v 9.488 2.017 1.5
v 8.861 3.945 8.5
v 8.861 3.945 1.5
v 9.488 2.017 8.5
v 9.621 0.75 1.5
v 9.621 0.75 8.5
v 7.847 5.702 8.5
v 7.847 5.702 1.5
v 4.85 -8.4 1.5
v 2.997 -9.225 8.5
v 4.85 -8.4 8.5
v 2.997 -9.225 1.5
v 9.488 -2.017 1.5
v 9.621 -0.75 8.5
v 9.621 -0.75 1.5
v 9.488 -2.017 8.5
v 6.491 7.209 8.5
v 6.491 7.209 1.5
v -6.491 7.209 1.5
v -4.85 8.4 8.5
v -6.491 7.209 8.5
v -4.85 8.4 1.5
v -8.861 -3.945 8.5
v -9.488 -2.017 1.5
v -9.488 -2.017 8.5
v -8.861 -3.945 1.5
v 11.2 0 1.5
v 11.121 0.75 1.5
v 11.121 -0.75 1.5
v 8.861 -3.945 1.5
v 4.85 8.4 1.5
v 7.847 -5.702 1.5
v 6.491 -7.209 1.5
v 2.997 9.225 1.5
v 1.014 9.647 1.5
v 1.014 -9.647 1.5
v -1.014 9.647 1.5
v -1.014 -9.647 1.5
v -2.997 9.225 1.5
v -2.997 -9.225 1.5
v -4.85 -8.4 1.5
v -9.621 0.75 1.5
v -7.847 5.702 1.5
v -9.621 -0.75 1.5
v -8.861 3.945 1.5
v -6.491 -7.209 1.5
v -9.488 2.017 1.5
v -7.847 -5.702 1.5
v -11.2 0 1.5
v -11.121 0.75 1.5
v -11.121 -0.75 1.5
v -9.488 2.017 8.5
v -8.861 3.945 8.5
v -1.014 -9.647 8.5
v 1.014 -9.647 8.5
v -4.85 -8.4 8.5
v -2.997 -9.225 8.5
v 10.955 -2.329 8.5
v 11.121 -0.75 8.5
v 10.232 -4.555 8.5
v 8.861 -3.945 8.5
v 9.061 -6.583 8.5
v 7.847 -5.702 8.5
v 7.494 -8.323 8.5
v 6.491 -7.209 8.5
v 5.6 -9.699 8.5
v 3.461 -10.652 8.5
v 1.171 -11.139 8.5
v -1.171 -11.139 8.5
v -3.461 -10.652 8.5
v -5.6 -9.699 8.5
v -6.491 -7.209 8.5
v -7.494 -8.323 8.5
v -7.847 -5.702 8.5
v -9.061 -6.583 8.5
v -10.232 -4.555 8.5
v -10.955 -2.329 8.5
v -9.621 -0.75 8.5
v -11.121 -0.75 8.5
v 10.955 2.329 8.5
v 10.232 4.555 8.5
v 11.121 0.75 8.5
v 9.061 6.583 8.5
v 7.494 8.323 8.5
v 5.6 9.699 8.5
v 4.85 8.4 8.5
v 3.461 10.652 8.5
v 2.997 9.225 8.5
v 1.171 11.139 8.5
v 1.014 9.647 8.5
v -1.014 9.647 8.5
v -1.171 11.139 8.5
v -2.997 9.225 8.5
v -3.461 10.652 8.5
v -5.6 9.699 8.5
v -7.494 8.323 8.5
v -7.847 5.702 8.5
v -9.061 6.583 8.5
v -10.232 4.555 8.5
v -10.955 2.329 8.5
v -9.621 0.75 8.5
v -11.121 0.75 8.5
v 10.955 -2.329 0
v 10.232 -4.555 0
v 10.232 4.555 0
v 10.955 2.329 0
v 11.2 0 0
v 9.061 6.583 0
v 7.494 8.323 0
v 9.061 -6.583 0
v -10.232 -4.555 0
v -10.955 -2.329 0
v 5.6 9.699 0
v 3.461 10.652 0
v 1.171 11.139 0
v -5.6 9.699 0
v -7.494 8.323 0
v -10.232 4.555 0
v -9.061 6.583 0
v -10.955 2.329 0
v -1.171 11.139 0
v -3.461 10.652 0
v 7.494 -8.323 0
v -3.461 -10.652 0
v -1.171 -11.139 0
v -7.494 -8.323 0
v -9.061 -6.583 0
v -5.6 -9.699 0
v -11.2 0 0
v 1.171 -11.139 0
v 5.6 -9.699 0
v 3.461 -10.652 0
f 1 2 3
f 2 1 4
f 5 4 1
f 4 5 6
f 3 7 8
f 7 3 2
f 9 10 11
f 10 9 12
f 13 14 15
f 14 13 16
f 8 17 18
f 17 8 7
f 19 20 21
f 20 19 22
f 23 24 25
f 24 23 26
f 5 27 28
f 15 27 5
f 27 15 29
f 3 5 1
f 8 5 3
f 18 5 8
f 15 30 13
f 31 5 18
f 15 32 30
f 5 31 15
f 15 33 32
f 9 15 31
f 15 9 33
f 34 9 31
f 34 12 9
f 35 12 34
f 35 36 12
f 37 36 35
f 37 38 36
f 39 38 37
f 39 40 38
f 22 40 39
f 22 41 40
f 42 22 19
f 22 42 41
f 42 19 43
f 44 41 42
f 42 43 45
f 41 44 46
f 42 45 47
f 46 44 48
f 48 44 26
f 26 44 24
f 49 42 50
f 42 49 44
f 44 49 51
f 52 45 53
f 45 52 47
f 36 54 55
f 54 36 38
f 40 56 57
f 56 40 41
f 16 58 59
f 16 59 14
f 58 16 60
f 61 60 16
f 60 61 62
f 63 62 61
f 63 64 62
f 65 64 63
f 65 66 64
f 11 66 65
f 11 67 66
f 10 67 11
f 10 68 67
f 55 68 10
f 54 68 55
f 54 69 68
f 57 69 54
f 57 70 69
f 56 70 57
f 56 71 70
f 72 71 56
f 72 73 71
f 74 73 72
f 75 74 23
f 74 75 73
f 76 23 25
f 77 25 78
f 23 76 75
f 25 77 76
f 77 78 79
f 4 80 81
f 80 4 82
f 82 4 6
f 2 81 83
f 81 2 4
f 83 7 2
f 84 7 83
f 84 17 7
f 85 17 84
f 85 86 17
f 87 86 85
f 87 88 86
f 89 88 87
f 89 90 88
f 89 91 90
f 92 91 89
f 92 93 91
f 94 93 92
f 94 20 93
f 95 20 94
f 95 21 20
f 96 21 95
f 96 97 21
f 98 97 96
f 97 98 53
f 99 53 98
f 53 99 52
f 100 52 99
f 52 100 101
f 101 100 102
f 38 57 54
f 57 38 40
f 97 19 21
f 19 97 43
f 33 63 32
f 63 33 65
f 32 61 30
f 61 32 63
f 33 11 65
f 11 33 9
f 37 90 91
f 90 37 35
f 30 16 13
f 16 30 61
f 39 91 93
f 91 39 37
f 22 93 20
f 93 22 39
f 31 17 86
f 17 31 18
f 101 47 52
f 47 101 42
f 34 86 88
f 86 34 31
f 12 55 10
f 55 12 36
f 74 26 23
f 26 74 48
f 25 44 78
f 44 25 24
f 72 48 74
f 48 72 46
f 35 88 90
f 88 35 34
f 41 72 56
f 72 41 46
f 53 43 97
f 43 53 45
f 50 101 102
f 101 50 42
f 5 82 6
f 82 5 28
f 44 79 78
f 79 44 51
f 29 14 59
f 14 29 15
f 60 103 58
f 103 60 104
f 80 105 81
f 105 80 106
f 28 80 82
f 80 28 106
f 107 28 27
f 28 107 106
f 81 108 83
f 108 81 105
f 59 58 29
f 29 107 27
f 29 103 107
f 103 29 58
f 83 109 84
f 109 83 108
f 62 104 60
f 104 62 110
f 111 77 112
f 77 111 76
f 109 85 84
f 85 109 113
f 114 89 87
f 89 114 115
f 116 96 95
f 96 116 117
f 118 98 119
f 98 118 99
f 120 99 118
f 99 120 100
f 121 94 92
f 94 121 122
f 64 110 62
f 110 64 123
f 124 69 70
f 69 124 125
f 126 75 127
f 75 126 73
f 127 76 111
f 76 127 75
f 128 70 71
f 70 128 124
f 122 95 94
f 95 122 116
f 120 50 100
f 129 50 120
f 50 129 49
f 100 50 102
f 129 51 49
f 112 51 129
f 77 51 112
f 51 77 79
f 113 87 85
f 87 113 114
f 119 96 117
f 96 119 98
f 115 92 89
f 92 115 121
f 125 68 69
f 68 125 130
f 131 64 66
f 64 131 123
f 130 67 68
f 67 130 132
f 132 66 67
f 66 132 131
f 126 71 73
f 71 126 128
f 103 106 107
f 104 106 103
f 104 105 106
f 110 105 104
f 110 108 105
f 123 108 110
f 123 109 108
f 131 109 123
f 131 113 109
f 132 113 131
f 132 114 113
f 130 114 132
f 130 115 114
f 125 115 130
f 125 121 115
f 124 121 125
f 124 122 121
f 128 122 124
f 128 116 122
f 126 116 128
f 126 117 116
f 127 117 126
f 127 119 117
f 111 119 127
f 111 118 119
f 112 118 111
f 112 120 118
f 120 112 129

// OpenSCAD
width = 19.4; //mm
height = 7; //mm
thickness = 1.5; //mm

difference() {
    cylinder(r = width / 2 + thickness, h = height + thickness);
    translate([0,0,thickness]) {
        cylinder(r = width / 2, h = height);
        translate([0 - width, - (thickness / 2), 0]) {
            cube([width * 2, thickness, height]);
        }
    }
}
